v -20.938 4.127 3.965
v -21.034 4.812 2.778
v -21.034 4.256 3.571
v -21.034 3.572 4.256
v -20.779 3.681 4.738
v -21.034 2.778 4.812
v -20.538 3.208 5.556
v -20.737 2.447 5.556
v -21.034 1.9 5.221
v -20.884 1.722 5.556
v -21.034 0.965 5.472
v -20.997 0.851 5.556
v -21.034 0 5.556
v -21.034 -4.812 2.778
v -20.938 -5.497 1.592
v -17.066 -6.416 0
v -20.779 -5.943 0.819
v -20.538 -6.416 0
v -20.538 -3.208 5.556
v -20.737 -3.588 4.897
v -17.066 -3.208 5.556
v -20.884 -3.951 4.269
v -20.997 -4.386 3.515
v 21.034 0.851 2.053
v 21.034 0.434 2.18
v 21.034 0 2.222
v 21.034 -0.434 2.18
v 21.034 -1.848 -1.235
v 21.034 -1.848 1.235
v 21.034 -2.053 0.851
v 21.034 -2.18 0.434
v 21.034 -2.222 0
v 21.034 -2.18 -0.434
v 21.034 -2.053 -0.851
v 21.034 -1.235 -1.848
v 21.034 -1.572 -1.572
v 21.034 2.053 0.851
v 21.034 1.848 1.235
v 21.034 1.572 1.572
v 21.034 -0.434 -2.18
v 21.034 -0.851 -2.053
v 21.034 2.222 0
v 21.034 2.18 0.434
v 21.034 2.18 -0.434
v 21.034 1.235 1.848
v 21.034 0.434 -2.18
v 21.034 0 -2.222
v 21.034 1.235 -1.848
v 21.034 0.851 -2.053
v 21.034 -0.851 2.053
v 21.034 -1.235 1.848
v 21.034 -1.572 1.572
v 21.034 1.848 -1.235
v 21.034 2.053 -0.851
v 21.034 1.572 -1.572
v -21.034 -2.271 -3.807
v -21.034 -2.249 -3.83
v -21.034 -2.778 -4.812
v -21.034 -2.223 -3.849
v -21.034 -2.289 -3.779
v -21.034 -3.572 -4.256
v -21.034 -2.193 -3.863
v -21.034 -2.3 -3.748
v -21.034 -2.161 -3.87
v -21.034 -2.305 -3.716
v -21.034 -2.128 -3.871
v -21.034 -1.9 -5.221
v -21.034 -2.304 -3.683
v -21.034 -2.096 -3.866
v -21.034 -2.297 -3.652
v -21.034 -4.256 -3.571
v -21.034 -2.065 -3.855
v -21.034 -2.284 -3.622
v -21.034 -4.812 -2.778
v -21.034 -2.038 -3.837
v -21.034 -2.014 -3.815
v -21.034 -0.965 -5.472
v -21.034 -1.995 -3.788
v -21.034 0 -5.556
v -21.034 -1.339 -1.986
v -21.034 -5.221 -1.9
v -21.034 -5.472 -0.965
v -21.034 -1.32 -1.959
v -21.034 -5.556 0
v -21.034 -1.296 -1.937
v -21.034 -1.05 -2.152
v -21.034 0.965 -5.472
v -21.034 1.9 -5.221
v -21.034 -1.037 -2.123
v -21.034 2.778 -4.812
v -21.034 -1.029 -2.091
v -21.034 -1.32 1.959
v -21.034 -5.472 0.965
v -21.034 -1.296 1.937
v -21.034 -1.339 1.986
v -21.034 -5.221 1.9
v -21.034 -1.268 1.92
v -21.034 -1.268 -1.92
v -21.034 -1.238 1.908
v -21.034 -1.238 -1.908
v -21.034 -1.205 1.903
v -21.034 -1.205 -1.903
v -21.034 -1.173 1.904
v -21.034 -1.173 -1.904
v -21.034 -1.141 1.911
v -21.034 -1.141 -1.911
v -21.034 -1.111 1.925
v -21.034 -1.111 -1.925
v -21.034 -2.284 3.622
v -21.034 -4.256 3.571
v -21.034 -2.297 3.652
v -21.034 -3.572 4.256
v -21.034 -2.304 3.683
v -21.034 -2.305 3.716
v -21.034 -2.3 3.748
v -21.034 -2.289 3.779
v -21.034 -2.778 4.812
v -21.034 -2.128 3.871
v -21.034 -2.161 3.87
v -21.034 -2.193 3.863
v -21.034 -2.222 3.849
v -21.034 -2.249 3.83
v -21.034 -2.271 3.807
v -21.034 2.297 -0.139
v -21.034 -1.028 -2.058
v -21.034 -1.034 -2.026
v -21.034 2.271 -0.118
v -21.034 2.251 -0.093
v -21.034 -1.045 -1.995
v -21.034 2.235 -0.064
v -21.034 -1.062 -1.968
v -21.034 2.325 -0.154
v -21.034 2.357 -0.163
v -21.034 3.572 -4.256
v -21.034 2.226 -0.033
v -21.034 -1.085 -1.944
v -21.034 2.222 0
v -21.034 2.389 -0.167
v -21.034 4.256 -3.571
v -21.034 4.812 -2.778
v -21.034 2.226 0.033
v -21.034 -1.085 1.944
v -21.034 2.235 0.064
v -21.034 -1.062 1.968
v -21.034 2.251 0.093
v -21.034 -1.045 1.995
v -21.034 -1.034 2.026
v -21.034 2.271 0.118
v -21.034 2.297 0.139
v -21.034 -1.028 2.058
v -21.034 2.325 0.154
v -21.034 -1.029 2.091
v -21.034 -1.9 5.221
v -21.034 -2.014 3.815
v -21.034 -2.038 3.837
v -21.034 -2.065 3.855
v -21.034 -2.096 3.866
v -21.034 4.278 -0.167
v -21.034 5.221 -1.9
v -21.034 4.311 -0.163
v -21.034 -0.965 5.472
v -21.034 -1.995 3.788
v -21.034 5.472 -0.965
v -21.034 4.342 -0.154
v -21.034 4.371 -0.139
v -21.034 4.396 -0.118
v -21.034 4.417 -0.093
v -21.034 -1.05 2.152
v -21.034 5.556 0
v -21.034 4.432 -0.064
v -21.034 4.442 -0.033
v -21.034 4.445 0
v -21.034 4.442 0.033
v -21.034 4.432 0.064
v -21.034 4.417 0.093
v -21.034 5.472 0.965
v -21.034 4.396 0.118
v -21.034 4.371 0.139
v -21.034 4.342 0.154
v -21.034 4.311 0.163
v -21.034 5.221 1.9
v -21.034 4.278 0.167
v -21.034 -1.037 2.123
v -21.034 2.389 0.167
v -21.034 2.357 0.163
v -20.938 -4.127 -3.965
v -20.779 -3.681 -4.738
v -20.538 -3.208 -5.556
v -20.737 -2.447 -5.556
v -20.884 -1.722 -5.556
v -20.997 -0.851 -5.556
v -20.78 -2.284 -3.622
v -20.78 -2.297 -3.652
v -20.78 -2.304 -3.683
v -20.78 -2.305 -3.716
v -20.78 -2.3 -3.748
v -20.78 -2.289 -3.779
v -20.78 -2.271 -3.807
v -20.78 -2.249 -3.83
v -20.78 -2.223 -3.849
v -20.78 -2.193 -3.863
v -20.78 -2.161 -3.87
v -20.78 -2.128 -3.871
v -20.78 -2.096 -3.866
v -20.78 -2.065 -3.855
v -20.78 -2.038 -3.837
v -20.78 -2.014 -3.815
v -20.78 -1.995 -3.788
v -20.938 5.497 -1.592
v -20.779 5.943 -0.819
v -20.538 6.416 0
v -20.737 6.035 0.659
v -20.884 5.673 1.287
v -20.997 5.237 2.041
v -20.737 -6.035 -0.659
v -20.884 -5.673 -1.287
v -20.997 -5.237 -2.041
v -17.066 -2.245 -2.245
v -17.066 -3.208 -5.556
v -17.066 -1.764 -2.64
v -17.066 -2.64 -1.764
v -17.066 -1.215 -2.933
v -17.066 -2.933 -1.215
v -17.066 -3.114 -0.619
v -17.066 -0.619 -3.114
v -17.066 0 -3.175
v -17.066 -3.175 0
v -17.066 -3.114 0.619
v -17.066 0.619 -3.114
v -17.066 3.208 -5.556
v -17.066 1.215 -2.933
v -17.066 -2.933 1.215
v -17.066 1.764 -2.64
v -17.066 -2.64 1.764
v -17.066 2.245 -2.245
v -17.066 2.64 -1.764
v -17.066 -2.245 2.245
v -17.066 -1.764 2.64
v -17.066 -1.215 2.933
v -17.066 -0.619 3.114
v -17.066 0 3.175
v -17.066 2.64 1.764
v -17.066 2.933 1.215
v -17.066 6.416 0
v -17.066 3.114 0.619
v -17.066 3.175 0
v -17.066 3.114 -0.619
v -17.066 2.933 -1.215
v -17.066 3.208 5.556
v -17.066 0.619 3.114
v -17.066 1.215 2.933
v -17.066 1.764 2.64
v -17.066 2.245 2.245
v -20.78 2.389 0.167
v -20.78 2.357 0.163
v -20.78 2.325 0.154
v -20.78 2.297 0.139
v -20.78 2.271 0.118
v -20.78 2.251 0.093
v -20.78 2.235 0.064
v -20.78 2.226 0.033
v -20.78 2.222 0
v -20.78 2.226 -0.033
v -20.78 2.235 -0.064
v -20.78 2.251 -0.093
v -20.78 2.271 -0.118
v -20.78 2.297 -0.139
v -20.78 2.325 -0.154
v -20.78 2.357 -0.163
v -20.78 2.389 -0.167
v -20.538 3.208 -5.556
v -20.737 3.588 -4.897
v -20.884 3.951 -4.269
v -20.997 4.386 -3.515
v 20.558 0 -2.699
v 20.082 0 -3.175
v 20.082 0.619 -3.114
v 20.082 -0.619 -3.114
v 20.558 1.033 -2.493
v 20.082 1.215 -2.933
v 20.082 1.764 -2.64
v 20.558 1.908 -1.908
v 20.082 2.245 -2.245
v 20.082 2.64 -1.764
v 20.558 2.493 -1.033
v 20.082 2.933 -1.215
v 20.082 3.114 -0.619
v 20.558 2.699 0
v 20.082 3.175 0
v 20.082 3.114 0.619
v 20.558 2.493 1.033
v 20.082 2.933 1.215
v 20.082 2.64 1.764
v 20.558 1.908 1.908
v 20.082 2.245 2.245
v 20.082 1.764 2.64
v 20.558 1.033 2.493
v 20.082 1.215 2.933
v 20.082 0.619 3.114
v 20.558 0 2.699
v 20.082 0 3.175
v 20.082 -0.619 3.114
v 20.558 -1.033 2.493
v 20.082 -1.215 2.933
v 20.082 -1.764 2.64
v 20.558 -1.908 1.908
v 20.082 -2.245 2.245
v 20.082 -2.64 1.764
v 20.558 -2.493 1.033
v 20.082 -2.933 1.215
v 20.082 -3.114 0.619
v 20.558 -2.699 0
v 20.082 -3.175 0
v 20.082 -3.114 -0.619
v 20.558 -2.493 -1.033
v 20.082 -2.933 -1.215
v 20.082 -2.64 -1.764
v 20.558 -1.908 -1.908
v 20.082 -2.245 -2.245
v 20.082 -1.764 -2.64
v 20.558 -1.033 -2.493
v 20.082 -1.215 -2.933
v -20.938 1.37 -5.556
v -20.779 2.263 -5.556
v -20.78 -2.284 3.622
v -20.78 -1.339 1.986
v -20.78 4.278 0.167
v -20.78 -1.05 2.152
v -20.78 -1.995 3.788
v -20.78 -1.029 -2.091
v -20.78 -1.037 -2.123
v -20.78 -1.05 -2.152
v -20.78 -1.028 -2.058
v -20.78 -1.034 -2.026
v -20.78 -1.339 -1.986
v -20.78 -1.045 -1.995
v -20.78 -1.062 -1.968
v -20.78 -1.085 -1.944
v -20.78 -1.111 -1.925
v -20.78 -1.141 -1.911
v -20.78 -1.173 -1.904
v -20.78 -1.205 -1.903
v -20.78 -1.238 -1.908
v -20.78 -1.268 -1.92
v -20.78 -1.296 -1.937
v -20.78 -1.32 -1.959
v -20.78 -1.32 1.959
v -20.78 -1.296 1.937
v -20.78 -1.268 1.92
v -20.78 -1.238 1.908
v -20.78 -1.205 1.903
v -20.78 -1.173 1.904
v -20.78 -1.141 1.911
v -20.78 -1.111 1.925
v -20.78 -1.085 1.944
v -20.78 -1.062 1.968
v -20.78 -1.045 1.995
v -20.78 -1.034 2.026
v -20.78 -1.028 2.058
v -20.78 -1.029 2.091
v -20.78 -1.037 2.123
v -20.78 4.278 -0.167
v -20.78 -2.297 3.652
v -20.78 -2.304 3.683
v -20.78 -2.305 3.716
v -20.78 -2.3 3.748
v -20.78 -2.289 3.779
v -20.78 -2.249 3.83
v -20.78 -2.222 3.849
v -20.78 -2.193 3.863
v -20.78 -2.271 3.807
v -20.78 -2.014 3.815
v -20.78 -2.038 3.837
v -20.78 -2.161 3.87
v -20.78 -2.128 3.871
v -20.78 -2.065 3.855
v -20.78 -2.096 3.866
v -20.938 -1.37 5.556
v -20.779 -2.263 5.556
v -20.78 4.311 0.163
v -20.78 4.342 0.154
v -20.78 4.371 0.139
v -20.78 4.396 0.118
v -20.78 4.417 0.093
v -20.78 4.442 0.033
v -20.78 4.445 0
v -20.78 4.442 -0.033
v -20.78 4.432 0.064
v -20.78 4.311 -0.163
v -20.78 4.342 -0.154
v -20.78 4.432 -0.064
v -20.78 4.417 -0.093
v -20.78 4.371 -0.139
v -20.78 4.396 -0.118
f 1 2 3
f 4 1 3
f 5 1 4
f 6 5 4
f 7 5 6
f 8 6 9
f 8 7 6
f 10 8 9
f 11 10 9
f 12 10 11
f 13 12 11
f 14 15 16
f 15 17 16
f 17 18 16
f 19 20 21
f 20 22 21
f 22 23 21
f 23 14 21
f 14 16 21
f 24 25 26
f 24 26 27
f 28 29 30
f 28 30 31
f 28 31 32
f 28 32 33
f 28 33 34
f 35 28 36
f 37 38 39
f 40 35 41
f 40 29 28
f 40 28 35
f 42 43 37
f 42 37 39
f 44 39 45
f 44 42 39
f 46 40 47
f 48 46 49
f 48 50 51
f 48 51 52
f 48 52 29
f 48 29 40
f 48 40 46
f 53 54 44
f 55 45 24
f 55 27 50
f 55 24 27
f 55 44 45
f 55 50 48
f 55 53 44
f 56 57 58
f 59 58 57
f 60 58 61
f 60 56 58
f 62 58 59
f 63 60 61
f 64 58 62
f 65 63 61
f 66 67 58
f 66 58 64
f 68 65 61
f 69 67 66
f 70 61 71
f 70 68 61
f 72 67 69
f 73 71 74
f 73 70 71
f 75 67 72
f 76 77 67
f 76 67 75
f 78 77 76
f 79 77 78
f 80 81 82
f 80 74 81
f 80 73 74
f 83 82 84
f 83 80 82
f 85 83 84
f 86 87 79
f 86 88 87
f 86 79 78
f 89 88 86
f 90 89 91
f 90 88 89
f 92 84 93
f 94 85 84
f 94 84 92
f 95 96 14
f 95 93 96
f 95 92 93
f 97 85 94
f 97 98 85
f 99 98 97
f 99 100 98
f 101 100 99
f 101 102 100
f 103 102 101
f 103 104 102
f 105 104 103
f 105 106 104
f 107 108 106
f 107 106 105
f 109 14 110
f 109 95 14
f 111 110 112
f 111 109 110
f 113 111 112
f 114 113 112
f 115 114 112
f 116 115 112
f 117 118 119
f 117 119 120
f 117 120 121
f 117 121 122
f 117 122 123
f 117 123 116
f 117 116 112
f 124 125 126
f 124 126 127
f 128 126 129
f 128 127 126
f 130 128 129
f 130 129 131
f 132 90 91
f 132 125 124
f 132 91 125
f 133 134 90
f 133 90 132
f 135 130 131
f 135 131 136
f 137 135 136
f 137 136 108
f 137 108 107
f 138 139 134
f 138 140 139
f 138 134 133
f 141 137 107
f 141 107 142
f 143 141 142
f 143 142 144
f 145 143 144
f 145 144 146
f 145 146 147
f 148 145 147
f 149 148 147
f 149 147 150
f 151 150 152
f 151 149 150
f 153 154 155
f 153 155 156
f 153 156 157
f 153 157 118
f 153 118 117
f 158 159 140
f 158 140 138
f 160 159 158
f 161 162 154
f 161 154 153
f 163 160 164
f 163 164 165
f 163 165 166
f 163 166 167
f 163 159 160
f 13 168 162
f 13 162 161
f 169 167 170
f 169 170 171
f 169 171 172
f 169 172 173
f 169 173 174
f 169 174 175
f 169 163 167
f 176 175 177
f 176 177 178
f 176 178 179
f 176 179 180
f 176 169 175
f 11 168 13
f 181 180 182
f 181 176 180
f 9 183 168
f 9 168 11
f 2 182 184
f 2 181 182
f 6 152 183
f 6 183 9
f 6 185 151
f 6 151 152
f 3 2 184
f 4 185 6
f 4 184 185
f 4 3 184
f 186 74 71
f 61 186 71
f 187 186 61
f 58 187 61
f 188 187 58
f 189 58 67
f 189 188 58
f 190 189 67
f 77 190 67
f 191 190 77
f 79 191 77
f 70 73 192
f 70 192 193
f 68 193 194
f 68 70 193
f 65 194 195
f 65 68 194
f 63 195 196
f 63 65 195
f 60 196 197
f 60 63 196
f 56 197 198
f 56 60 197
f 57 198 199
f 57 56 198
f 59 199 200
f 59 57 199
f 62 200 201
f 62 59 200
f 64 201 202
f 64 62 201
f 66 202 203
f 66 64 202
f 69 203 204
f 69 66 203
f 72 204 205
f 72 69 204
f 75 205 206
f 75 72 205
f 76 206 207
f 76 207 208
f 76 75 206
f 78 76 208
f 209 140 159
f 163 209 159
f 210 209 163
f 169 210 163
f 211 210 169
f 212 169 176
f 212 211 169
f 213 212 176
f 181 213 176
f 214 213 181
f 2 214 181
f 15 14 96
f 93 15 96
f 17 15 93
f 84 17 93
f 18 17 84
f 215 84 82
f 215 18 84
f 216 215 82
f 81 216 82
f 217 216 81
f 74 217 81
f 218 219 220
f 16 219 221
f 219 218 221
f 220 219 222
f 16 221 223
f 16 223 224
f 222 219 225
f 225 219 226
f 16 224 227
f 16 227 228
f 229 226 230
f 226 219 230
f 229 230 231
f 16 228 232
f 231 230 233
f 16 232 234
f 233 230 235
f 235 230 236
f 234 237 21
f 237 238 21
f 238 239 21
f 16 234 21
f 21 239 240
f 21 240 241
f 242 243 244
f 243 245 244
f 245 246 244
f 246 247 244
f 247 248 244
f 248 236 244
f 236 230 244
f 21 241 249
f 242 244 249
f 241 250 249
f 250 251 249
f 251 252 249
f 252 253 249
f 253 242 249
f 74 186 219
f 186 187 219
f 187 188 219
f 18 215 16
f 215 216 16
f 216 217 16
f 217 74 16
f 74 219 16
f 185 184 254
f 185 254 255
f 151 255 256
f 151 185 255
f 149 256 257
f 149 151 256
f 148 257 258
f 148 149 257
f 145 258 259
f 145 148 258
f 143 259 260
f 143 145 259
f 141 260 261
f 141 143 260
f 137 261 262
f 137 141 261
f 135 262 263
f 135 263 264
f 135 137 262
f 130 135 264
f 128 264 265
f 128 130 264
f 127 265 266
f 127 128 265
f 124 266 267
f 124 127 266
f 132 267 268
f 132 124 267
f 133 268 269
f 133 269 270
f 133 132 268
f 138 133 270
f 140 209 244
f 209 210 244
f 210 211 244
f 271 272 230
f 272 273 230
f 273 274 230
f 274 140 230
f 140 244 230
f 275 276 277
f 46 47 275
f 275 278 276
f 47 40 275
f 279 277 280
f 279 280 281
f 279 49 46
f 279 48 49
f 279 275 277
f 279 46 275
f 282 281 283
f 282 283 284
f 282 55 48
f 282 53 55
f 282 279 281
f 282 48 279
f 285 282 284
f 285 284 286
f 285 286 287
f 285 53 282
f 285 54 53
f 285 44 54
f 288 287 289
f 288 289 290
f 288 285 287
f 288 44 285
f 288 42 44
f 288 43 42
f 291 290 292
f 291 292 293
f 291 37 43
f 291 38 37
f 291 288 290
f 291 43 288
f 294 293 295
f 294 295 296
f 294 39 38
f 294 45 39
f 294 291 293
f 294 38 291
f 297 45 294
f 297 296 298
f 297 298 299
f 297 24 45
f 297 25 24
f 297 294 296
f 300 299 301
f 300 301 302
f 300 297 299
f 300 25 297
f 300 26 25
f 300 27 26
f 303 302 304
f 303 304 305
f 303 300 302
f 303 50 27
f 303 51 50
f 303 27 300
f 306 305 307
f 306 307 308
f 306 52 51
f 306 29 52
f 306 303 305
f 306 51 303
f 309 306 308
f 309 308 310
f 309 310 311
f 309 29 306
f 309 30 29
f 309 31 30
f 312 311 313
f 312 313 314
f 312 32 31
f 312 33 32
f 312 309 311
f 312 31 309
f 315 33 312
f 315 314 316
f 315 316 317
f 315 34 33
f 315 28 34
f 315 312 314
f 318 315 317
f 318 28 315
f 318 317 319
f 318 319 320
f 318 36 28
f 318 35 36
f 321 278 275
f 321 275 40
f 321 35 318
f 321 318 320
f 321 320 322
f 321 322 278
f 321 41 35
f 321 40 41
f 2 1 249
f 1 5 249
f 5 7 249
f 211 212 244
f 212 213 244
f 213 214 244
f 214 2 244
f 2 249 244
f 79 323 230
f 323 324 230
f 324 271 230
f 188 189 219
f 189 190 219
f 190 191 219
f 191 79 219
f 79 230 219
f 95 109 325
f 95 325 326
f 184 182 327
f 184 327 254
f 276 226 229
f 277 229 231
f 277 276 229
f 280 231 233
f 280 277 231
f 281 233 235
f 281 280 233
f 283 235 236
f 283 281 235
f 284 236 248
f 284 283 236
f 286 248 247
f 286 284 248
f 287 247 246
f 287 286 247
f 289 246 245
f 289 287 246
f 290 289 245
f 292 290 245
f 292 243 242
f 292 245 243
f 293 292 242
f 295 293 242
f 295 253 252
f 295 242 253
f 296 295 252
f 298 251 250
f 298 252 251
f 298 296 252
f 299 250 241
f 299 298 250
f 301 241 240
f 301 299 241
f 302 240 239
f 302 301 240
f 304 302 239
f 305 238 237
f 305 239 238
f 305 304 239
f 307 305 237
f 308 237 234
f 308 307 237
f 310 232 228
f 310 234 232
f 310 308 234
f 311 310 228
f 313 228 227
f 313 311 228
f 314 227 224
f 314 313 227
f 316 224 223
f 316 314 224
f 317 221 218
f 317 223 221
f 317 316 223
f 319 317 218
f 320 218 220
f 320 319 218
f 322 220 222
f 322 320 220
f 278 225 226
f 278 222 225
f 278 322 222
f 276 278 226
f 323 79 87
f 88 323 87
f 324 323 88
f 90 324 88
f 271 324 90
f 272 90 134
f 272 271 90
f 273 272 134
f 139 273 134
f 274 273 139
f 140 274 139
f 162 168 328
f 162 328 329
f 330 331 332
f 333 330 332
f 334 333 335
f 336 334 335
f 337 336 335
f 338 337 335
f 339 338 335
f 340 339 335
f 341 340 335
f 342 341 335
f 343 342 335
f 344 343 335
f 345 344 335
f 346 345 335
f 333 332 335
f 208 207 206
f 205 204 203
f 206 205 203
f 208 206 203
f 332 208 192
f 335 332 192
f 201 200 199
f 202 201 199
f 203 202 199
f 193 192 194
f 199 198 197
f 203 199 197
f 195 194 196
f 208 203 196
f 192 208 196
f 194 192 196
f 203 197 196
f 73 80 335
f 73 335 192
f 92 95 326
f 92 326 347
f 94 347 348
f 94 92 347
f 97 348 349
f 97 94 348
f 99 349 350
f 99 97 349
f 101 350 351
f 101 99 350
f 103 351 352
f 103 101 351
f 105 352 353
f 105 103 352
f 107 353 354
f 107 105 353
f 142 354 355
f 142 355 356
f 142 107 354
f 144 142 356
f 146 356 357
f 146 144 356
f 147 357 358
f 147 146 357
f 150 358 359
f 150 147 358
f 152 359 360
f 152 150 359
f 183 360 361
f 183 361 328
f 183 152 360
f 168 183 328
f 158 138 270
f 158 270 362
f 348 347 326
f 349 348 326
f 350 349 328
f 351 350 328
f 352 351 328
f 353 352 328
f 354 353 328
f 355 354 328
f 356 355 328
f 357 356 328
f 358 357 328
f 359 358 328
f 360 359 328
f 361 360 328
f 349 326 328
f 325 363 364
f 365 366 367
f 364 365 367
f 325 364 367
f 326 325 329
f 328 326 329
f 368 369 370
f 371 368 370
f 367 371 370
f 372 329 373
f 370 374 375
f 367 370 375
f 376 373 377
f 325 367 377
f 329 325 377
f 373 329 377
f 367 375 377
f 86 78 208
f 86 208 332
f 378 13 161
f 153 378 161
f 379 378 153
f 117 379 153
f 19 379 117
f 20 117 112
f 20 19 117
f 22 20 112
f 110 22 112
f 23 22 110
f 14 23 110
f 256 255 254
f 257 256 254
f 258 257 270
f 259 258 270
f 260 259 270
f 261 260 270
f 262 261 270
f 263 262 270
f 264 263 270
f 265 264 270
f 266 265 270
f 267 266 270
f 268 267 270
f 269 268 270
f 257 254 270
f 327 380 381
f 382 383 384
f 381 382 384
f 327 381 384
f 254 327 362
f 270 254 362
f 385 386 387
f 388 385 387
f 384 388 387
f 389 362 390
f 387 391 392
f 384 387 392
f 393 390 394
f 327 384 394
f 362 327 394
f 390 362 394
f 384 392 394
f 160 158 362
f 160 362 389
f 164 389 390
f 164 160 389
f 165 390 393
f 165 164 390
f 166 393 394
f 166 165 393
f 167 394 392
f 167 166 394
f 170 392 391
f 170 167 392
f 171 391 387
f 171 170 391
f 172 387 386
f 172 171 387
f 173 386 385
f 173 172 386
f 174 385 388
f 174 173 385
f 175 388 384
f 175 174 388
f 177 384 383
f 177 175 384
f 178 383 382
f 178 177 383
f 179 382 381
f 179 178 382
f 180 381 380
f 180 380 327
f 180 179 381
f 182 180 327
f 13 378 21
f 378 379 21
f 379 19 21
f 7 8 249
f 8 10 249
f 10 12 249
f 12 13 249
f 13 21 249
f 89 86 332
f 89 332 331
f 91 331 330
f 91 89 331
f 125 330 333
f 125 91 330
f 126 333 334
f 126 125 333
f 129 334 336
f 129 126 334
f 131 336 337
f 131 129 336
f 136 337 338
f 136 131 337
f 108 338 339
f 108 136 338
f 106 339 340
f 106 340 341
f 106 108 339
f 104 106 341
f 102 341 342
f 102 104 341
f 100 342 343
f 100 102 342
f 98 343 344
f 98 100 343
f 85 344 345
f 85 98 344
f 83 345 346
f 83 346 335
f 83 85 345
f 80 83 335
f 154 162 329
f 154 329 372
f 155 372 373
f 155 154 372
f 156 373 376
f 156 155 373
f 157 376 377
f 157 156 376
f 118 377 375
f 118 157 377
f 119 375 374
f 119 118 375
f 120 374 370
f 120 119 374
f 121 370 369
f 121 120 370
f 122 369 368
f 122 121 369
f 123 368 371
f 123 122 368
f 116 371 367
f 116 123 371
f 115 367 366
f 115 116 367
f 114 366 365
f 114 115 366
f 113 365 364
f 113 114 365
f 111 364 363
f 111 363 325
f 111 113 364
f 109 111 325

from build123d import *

# Parameters (mm, degrees)
SKETCH5_R           = 3.175
BOSS_EXTRUDE3_DEPTH = 38.1
CHAMFER1_SIZE       = 0.9525
BOSS_EXTRUDE4_DEPTH = 3.96875
SKETCH8_OUTSIDE_W   = 171.38
SKETCH8_OUTSIDE_H   = 173.1
SKETCH8_OUTSIDE_R   = 5.55625
CUT_EXTRUDE3_DEPTH  = 43.06875
CUT_EXTRUDE3_TAPER  = 60
CUT_EXTRUDE4_DEPTH  = 0.254
CIRPATTERN1_COUNT   = 3


with BuildPart() as part:
    # Sketch5 → Boss-Extrude3 (new body)
    with BuildSketch(Plane(origin=(21.034375, 0, 0), x_dir=(0, 0, -1), z_dir=(1, 0, 0))):
        Circle(SKETCH5_R)
    extrude(amount=-BOSS_EXTRUDE3_DEPTH)

    # Chamfer1
    chamfer1_edges = [part.edges().sort_by_distance(p)[0] for p in [
        (21.034375, 0, 3.175),
    ]]
    chamfer(chamfer1_edges, length=CHAMFER1_SIZE)

    # Sketch11 → Revolve1 (revolve)
    with BuildSketch(Plane.XY):
        Polygon((-17.065625, 3.175), (-17.065625, 0), (5.159375, 0), (1.984375, 3.175), align=None)
    revolve(axis=Axis((-17.065625, 0, 0), (1, 0, 0)))

    # Sketch6 → Boss-Extrude4 (add)
    with BuildSketch(Plane.ZY.offset(17.065625)):
        Polygon((5.55625, 3.207902433), (0, 6.415804866), (-5.55625, 3.207902433), (-5.55625, -3.207902433), (0, -6.415804866), (5.55625, -3.207902433), align=None)
    extrude(amount=BOSS_EXTRUDE4_DEPTH)

    # Sketch8 outside → Cut-Extrude3 (cut, through all)
    with BuildSketch(Plane.ZY.offset(21.034375)):
        Rectangle(SKETCH8_OUTSIDE_W, SKETCH8_OUTSIDE_H)
        Circle(SKETCH8_OUTSIDE_R, mode=Mode.SUBTRACT)
    extrude(amount=-CUT_EXTRUDE3_DEPTH, taper=CUT_EXTRUDE3_TAPER, mode=Mode.SUBTRACT)

    # Sketch12 → Cut-Extrude4 (cut)
    with BuildSketch(Plane.ZY.offset(21.034375)):
        with BuildLine():
            Line((0.1666875, 4.2783125), (0.1666875, 2.3891875))
            ThreePointArc((0.1666875, 2.3891875), (0, 2.2225), (-0.1666875, 2.3891875))
            Line((-0.1666875, 2.3891875), (-0.1666875, 4.2783125))
            ThreePointArc((-0.1666875, 4.2783125), (0, 4.445), (0.1666875, 4.2783125))
        make_face()
    cut_extrude4 = extrude(amount=-CUT_EXTRUDE4_DEPTH, mode=Mode.SUBTRACT)

    # CirPattern1: Cut-Extrude4 ×3 about axis
    cirpattern1_axis = Axis((0, 0, 0), (1, 0, 0))
    for i in range(1, CIRPATTERN1_COUNT):
        add(cut_extrude4.rotate(cirpattern1_axis, i * 360 / CIRPATTERN1_COUNT), mode=Mode.SUBTRACT)


solid = part.part
